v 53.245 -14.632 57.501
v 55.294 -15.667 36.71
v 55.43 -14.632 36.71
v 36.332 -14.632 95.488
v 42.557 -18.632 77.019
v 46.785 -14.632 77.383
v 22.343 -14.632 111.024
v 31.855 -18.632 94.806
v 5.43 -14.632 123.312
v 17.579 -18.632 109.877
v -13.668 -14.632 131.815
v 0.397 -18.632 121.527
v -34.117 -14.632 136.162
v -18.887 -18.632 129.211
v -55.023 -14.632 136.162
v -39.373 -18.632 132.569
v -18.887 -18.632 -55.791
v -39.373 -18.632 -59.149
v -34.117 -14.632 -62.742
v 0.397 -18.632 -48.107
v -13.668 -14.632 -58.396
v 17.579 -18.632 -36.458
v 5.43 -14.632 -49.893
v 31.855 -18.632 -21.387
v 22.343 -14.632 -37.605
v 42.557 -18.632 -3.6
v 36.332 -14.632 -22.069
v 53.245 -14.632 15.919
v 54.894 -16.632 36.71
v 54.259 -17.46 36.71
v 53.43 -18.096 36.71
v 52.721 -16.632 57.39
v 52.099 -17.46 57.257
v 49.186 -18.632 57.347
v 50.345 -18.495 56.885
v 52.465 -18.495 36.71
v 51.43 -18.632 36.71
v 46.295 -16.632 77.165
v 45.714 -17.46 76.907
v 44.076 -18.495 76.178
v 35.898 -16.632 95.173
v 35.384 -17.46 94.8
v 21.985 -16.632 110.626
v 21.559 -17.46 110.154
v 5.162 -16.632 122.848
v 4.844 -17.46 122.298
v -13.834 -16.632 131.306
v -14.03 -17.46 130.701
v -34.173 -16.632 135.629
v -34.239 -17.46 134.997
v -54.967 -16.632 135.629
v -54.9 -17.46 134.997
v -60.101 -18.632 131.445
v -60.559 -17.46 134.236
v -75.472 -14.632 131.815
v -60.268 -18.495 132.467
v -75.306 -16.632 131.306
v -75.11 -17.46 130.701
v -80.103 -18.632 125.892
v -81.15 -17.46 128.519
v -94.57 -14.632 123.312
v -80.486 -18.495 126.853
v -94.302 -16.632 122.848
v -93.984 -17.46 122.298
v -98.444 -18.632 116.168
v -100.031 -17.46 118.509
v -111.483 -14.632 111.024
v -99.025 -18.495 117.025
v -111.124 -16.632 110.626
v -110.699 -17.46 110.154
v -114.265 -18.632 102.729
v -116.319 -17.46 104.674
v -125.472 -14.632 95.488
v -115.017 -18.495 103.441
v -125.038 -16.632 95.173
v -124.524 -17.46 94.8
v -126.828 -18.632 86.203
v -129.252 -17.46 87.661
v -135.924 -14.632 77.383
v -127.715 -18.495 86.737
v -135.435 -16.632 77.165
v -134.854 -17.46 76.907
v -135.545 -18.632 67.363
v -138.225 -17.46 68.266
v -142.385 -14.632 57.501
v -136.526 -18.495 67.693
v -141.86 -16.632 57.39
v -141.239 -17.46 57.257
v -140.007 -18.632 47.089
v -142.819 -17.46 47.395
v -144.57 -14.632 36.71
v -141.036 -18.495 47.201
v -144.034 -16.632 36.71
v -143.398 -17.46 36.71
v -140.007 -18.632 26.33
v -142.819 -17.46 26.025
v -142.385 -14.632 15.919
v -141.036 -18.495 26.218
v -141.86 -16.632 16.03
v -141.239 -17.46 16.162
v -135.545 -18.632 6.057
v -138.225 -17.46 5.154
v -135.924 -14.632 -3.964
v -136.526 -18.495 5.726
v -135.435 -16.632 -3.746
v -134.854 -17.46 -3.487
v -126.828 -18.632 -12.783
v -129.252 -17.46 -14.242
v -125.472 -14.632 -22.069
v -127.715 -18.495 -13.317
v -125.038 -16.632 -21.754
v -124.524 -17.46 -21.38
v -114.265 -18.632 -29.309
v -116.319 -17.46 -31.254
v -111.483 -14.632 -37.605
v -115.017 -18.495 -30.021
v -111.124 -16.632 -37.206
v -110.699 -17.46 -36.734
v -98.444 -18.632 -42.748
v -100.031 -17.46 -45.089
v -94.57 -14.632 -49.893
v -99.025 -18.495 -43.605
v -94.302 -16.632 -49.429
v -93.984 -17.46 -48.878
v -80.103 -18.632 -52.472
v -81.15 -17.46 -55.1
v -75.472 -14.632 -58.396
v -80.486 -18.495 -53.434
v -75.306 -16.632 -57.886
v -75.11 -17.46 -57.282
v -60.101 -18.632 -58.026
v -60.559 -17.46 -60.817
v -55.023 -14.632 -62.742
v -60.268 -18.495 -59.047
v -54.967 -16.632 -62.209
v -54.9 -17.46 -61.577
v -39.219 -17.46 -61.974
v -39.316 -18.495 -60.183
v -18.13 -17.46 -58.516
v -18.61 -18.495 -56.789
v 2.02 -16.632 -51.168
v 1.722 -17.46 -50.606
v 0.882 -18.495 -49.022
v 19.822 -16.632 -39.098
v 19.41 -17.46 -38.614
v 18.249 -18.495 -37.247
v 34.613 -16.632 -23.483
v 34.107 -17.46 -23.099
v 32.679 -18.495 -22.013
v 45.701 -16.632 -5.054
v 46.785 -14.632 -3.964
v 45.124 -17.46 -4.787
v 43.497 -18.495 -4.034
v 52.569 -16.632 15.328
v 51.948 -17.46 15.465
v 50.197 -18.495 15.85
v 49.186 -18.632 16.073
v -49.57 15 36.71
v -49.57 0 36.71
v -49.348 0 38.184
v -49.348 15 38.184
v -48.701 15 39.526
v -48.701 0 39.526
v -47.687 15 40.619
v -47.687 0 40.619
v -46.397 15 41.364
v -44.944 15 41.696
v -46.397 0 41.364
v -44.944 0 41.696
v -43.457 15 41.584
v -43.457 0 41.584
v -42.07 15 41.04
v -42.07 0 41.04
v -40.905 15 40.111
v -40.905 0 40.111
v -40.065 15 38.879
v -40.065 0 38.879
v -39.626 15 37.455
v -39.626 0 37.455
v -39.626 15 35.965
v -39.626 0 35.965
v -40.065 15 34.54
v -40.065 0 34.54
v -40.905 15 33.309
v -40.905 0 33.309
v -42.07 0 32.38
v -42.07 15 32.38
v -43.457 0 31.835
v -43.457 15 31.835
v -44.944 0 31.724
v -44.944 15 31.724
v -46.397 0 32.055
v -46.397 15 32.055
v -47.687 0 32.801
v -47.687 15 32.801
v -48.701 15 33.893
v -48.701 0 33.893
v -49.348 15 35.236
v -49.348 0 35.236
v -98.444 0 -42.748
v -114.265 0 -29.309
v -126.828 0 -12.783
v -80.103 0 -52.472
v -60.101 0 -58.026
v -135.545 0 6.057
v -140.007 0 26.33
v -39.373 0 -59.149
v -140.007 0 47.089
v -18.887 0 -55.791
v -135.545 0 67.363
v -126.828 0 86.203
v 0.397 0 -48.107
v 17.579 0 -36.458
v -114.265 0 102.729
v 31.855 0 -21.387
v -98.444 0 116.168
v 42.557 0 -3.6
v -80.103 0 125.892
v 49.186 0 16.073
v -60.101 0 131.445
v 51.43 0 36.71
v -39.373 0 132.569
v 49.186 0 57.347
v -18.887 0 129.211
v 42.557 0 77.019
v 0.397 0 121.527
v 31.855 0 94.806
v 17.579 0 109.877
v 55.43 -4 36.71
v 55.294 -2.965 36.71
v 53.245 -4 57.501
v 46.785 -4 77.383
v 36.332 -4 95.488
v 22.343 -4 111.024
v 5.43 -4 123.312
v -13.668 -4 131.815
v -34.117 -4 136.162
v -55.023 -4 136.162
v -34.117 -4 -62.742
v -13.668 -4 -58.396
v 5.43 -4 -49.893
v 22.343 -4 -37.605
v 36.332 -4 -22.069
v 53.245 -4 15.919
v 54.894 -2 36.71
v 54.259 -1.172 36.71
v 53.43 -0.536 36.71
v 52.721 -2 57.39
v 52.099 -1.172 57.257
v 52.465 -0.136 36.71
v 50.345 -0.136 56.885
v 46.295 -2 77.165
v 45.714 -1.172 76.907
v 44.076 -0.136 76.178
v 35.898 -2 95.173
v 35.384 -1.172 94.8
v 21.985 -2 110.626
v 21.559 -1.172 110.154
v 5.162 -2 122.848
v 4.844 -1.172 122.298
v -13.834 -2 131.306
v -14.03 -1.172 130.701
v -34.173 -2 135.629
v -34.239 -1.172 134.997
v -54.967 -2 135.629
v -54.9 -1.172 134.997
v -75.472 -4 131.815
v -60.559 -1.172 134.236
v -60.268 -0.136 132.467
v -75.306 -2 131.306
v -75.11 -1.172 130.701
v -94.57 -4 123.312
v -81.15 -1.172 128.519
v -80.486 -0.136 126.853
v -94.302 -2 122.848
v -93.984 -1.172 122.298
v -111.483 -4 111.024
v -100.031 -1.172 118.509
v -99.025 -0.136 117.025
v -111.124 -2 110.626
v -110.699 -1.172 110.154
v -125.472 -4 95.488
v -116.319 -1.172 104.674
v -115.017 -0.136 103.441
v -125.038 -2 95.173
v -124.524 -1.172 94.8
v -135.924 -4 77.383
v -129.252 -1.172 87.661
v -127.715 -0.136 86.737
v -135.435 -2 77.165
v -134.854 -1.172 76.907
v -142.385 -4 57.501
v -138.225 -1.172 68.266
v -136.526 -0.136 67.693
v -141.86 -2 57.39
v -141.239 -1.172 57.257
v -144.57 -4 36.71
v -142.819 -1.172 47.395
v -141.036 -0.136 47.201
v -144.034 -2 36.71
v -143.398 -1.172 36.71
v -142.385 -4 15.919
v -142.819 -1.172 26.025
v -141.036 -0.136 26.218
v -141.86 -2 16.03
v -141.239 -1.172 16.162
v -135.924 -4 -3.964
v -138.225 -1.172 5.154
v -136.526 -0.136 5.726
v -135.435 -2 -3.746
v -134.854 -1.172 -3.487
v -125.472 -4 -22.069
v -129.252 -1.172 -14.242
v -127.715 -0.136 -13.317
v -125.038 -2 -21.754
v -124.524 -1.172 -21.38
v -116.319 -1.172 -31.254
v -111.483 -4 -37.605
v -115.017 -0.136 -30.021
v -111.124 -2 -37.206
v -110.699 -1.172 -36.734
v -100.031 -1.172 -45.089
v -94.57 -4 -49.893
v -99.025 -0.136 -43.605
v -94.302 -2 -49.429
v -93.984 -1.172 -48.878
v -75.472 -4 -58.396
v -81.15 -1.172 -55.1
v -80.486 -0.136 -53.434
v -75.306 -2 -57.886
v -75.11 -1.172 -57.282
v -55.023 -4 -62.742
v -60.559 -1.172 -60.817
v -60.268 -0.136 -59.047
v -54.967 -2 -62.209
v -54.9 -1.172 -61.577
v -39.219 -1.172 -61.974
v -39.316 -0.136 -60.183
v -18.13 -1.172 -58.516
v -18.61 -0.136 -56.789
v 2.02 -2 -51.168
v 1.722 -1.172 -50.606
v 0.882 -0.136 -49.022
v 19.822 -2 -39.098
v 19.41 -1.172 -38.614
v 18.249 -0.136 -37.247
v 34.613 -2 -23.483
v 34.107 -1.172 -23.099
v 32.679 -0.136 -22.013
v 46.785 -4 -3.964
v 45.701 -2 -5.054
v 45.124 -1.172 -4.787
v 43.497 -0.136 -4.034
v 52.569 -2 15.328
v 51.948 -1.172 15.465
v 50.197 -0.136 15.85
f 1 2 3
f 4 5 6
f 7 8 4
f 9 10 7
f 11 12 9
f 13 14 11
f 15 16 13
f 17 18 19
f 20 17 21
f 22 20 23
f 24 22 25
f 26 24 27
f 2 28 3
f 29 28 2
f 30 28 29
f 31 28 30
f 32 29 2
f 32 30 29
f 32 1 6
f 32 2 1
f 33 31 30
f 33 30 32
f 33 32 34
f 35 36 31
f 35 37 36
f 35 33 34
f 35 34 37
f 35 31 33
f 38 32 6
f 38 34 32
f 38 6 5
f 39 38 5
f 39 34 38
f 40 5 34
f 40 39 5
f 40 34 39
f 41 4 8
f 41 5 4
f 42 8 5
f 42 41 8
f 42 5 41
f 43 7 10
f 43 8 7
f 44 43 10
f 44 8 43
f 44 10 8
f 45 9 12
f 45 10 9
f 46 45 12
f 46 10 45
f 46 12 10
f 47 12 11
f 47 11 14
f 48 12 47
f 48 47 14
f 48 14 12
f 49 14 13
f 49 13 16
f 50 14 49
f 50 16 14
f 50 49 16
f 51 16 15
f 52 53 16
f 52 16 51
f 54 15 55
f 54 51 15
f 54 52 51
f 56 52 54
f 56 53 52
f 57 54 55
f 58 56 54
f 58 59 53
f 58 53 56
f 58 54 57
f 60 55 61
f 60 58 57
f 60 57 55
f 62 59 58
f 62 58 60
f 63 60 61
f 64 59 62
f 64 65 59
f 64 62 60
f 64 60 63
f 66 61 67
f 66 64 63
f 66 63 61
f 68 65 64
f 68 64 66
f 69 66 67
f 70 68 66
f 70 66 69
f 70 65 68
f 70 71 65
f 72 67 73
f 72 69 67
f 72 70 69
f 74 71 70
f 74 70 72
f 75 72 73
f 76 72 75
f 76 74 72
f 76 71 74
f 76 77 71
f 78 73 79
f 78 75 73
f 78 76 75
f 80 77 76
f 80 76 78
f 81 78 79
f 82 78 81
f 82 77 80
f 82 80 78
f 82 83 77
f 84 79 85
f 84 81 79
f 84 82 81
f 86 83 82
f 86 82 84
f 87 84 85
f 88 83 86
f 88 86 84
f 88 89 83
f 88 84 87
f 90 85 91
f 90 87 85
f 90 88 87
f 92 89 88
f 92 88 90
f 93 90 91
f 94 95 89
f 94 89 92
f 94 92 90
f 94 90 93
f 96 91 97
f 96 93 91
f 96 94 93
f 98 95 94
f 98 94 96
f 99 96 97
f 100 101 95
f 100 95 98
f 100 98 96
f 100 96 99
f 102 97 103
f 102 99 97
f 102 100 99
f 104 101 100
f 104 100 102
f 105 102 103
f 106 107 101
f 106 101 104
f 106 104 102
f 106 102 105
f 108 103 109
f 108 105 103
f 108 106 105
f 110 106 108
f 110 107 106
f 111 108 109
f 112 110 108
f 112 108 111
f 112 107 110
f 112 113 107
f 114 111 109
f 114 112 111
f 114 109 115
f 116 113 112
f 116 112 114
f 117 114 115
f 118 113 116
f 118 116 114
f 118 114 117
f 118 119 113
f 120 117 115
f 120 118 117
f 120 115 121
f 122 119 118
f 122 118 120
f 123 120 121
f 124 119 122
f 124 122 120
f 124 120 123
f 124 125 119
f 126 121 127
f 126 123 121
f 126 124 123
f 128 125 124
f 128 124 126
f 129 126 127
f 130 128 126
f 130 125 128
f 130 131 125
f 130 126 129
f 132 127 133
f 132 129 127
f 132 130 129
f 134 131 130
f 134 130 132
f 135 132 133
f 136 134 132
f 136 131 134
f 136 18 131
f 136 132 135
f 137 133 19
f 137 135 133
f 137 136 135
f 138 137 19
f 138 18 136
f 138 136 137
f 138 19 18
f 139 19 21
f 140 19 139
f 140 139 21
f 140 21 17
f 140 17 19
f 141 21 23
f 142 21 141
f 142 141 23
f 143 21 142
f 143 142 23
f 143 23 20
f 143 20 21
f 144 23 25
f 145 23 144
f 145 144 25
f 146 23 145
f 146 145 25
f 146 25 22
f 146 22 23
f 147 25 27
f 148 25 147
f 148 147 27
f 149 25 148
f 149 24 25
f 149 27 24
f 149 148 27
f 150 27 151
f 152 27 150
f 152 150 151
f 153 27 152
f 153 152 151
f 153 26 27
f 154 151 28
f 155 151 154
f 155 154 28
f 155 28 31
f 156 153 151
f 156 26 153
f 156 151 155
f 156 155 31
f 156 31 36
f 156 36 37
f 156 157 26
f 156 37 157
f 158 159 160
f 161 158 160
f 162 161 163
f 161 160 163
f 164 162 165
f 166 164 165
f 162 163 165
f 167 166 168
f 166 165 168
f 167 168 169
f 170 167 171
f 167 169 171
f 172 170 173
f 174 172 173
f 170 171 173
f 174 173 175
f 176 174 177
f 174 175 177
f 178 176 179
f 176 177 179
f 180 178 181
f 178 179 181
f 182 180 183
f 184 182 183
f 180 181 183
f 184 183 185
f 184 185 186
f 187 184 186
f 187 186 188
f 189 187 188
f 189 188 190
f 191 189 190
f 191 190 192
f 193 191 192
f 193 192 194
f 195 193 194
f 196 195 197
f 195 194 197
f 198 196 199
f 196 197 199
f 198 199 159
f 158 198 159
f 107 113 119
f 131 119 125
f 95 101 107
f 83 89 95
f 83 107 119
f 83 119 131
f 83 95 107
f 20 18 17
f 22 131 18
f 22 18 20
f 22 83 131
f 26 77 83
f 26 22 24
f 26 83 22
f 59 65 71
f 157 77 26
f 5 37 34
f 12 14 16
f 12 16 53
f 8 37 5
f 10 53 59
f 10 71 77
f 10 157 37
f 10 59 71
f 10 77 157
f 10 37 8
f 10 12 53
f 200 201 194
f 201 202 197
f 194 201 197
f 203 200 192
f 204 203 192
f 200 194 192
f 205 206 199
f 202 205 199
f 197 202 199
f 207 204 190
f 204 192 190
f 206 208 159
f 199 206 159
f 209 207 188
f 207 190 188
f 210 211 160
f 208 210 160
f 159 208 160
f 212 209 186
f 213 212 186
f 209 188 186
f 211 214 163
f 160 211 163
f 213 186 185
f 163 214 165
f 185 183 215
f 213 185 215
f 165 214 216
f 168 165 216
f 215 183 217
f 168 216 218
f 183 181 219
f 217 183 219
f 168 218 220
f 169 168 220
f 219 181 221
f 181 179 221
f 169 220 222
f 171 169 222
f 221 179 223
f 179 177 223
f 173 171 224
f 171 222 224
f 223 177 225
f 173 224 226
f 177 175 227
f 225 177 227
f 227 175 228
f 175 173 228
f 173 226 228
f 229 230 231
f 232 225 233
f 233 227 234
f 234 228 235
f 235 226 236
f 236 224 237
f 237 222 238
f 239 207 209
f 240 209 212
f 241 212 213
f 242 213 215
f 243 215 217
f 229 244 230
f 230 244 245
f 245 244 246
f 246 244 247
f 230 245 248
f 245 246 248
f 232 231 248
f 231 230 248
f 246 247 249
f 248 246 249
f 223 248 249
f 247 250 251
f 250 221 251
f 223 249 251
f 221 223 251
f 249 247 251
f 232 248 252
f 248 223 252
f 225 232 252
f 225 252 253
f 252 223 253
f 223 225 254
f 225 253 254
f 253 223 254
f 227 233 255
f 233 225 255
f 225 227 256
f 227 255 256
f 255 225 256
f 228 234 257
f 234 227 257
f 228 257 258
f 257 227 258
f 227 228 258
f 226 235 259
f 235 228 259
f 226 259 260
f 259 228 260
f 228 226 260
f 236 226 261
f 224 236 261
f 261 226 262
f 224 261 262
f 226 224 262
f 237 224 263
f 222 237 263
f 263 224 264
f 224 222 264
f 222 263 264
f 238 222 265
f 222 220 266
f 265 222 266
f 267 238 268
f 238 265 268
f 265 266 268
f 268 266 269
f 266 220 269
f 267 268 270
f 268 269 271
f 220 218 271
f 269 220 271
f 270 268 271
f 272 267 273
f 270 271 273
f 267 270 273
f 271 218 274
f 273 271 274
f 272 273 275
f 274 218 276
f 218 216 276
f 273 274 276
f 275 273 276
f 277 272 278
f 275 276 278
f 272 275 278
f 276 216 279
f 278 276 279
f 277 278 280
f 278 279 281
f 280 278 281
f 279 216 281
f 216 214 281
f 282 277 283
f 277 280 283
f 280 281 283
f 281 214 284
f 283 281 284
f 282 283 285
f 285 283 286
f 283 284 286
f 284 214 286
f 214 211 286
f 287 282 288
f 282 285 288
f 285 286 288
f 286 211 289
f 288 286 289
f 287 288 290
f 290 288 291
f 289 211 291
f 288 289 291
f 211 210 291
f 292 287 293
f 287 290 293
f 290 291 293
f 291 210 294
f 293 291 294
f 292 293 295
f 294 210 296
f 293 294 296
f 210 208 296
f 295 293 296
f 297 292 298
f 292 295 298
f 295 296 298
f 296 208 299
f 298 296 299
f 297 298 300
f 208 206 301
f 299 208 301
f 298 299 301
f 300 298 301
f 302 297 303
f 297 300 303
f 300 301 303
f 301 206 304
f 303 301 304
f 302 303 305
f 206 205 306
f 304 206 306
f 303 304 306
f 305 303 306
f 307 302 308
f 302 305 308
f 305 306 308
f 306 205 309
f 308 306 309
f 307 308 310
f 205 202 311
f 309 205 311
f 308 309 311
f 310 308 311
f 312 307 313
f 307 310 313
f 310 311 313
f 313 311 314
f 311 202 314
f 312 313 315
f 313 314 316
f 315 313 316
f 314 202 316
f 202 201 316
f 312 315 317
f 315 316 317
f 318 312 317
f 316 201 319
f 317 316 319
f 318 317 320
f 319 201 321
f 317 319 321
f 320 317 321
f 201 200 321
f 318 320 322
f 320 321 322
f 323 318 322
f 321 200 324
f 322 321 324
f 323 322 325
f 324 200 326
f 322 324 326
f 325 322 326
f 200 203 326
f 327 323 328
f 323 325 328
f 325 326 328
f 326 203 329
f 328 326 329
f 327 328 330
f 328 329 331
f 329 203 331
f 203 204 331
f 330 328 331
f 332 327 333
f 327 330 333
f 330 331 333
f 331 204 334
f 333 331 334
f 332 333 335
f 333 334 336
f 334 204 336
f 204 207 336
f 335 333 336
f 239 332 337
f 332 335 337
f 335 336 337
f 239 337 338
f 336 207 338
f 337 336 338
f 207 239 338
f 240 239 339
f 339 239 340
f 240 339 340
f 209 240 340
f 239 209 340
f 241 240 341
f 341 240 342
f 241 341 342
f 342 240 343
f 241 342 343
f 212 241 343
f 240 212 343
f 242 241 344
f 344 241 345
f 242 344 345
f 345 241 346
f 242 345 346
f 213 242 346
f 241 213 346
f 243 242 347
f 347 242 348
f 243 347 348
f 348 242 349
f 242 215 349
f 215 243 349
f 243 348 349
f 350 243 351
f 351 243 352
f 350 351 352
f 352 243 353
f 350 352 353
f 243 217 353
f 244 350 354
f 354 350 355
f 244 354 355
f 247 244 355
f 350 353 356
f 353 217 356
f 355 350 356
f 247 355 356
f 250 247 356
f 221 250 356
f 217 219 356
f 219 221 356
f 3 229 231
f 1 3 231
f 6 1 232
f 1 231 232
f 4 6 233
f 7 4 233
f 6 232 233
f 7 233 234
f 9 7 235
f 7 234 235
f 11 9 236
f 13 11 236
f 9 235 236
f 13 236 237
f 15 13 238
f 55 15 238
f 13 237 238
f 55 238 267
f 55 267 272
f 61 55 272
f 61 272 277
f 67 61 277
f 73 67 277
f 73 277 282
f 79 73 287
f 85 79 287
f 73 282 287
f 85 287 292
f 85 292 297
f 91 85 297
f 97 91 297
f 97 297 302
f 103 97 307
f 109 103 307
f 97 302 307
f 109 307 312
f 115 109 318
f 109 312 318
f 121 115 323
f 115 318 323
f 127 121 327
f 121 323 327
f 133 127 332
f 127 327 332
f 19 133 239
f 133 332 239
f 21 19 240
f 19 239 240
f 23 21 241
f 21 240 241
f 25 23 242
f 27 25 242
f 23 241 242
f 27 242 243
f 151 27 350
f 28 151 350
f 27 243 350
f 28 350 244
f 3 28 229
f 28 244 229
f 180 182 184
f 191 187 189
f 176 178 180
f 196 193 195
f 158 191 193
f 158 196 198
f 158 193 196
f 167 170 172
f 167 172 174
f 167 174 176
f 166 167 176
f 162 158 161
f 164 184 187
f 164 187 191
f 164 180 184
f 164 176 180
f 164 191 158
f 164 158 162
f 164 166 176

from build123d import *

# Parameters (mm, degrees)
F0_R     = 100
F1_DEPTH = 18.63153
F2_R     = 4
F3_R     = 5
F4_DEPTH = 15


with BuildPart() as f1:
    # F0 (on Front) → F1 (new body)
    with BuildSketch(Plane.XZ):
        with Locations((-44.569857, 36.709767)):
            Circle(F0_R)
    extrude(amount=F1_DEPTH)

    # F2
    f2_edges = [f1.edges().sort_by_distance(p)[0] for p in [
        (-144.569857, -18.63153, 36.709767),
        (-144.569857, 0, 36.709767),
    ]]
    fillet(f2_edges, radius=F2_R)

    # F3 (on face) → F4 (join)
    with BuildSketch(Plane(origin=(0, 0, 0), x_dir=(-1, 0, 0), z_dir=(0, 1, 0))):
        with Locations((44.569857, 36.709767)):
            Circle(F3_R)
    extrude(amount=F4_DEPTH)


solid = f1.part
